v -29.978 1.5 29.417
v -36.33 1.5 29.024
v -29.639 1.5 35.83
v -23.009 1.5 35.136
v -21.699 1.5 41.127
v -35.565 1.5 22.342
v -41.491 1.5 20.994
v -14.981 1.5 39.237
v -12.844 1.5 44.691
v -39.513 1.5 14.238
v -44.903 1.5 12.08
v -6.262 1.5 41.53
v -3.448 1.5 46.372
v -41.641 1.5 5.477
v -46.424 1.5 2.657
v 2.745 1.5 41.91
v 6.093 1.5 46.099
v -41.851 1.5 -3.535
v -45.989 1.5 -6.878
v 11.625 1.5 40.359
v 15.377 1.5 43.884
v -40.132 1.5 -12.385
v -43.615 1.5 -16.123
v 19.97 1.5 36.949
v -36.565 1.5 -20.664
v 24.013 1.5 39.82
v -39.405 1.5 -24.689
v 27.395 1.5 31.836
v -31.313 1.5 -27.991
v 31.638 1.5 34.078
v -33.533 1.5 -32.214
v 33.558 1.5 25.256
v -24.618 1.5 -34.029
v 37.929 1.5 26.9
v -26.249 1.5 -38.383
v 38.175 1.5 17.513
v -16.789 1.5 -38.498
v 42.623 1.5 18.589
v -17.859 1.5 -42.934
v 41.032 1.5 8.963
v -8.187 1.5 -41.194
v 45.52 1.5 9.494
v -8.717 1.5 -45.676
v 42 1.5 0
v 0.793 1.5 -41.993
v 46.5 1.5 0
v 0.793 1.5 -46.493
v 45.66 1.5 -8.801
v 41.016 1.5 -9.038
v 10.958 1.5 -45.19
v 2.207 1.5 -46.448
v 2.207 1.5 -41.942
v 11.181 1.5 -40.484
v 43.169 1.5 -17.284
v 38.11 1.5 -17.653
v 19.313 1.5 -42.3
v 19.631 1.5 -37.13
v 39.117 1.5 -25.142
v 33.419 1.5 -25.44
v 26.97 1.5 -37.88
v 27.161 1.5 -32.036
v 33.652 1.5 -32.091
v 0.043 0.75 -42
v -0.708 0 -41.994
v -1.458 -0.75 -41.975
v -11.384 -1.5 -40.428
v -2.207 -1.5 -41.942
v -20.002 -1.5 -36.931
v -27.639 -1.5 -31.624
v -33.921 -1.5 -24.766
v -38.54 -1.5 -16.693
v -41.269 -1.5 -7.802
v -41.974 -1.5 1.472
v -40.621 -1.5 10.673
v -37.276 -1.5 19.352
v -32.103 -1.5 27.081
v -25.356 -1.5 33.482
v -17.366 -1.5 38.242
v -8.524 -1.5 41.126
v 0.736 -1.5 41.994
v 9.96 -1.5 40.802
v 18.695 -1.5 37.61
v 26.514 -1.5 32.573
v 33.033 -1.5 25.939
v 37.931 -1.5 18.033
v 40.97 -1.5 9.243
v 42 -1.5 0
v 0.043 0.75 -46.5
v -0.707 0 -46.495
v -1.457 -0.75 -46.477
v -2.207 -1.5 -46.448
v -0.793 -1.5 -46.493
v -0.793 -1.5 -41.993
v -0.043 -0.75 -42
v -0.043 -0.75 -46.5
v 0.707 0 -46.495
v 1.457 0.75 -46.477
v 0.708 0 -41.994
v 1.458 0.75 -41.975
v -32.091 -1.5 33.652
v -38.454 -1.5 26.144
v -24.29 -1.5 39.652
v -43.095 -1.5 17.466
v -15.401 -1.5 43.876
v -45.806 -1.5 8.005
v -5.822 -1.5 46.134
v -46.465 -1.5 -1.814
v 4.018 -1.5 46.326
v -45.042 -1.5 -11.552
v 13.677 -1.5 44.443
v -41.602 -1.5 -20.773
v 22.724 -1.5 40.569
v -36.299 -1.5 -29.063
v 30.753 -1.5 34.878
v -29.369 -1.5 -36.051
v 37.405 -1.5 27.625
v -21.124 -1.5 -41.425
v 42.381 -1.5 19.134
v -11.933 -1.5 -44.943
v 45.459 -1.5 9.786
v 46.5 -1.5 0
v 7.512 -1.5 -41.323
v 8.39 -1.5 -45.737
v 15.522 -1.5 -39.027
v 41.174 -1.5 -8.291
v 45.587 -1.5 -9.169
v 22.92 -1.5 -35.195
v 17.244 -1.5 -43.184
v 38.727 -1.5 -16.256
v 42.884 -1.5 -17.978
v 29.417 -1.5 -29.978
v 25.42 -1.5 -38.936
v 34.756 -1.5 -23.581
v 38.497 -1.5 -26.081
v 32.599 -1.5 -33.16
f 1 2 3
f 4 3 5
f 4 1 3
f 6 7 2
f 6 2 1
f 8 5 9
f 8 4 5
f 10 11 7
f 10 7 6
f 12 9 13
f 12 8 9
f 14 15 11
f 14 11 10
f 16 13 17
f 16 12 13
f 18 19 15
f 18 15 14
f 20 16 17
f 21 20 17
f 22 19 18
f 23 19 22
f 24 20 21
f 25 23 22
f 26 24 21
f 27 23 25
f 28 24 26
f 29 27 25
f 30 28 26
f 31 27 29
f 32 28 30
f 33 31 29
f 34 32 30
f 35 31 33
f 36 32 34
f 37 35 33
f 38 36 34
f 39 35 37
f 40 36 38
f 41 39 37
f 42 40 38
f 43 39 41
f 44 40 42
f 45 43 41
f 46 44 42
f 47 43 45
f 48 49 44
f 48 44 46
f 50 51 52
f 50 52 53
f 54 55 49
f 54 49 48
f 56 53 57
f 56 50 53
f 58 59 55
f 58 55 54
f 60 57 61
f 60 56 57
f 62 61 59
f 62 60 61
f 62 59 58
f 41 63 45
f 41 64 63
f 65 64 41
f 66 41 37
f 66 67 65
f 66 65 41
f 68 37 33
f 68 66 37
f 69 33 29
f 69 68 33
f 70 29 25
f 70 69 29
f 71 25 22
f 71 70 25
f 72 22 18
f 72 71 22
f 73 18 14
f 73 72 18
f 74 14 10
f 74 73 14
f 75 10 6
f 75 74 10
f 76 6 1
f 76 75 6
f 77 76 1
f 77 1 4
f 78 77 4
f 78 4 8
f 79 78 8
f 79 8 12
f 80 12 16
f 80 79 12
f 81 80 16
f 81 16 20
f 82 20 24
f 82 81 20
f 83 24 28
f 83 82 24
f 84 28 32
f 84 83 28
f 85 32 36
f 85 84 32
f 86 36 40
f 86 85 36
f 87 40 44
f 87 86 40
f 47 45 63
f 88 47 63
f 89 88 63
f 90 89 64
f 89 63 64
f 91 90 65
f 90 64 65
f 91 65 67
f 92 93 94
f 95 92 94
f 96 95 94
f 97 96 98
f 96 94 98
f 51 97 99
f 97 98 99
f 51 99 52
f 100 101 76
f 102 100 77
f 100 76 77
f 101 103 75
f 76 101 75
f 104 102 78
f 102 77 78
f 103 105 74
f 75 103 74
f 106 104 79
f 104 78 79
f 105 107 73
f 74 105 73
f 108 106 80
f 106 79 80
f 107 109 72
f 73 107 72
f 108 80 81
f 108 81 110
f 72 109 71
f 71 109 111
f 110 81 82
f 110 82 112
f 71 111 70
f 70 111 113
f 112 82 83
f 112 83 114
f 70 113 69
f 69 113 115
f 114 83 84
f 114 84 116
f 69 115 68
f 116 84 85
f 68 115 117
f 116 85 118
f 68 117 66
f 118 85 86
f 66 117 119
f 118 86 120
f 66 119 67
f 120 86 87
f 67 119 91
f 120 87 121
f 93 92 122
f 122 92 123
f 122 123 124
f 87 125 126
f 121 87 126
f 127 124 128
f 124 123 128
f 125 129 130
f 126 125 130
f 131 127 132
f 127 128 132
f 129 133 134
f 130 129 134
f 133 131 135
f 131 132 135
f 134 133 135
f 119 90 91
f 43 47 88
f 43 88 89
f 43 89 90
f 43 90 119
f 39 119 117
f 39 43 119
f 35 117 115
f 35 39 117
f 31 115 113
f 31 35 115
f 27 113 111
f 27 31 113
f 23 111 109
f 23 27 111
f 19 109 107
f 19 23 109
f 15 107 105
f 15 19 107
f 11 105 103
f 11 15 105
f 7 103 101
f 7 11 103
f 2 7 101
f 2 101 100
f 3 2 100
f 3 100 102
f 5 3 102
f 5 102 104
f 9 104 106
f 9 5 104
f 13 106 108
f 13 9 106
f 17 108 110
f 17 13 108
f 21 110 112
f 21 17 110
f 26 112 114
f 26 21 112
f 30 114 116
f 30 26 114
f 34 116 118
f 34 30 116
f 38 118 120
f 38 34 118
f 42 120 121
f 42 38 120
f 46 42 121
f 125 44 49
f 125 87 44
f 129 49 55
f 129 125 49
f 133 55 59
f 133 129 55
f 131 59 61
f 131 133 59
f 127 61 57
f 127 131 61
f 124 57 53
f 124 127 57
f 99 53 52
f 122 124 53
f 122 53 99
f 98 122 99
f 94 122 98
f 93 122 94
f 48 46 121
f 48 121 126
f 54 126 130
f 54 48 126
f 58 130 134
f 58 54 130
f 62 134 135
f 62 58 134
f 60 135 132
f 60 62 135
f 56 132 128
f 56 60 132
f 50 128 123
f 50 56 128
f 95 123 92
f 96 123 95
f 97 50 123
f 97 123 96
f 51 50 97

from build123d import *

# Parameters (mm, degrees)
SKETCH5_R           = 46.5
SKETCH5_R_2         = 42
BOSS_EXTRUDE3_DEPTH = 1.5
CUT_EXTRUDE3_DEPTH  = 66


with BuildPart() as part:
    # Sketch5 → Boss-Extrude3 (new body, symmetric)
    with BuildSketch(Plane(origin=(0, 0, 0), x_dir=(1, 0, 0), z_dir=(0, 1, 0))):
        Circle(SKETCH5_R)
        Circle(SKETCH5_R_2, mode=Mode.SUBTRACT)
    extrude(amount=BOSS_EXTRUDE3_DEPTH, both=True)

    # Sketch6 → Cut-Extrude3 (cut)
    with BuildSketch(Plane.XY):
        Polygon((-10.568822045, -11.275928826), (11.275928826, 10.568822045), (10.568822045, 11.275928826), (-11.275928826, -10.568822045), align=None)
    extrude(amount=-CUT_EXTRUDE3_DEPTH, mode=Mode.SUBTRACT)


solid = part.part
